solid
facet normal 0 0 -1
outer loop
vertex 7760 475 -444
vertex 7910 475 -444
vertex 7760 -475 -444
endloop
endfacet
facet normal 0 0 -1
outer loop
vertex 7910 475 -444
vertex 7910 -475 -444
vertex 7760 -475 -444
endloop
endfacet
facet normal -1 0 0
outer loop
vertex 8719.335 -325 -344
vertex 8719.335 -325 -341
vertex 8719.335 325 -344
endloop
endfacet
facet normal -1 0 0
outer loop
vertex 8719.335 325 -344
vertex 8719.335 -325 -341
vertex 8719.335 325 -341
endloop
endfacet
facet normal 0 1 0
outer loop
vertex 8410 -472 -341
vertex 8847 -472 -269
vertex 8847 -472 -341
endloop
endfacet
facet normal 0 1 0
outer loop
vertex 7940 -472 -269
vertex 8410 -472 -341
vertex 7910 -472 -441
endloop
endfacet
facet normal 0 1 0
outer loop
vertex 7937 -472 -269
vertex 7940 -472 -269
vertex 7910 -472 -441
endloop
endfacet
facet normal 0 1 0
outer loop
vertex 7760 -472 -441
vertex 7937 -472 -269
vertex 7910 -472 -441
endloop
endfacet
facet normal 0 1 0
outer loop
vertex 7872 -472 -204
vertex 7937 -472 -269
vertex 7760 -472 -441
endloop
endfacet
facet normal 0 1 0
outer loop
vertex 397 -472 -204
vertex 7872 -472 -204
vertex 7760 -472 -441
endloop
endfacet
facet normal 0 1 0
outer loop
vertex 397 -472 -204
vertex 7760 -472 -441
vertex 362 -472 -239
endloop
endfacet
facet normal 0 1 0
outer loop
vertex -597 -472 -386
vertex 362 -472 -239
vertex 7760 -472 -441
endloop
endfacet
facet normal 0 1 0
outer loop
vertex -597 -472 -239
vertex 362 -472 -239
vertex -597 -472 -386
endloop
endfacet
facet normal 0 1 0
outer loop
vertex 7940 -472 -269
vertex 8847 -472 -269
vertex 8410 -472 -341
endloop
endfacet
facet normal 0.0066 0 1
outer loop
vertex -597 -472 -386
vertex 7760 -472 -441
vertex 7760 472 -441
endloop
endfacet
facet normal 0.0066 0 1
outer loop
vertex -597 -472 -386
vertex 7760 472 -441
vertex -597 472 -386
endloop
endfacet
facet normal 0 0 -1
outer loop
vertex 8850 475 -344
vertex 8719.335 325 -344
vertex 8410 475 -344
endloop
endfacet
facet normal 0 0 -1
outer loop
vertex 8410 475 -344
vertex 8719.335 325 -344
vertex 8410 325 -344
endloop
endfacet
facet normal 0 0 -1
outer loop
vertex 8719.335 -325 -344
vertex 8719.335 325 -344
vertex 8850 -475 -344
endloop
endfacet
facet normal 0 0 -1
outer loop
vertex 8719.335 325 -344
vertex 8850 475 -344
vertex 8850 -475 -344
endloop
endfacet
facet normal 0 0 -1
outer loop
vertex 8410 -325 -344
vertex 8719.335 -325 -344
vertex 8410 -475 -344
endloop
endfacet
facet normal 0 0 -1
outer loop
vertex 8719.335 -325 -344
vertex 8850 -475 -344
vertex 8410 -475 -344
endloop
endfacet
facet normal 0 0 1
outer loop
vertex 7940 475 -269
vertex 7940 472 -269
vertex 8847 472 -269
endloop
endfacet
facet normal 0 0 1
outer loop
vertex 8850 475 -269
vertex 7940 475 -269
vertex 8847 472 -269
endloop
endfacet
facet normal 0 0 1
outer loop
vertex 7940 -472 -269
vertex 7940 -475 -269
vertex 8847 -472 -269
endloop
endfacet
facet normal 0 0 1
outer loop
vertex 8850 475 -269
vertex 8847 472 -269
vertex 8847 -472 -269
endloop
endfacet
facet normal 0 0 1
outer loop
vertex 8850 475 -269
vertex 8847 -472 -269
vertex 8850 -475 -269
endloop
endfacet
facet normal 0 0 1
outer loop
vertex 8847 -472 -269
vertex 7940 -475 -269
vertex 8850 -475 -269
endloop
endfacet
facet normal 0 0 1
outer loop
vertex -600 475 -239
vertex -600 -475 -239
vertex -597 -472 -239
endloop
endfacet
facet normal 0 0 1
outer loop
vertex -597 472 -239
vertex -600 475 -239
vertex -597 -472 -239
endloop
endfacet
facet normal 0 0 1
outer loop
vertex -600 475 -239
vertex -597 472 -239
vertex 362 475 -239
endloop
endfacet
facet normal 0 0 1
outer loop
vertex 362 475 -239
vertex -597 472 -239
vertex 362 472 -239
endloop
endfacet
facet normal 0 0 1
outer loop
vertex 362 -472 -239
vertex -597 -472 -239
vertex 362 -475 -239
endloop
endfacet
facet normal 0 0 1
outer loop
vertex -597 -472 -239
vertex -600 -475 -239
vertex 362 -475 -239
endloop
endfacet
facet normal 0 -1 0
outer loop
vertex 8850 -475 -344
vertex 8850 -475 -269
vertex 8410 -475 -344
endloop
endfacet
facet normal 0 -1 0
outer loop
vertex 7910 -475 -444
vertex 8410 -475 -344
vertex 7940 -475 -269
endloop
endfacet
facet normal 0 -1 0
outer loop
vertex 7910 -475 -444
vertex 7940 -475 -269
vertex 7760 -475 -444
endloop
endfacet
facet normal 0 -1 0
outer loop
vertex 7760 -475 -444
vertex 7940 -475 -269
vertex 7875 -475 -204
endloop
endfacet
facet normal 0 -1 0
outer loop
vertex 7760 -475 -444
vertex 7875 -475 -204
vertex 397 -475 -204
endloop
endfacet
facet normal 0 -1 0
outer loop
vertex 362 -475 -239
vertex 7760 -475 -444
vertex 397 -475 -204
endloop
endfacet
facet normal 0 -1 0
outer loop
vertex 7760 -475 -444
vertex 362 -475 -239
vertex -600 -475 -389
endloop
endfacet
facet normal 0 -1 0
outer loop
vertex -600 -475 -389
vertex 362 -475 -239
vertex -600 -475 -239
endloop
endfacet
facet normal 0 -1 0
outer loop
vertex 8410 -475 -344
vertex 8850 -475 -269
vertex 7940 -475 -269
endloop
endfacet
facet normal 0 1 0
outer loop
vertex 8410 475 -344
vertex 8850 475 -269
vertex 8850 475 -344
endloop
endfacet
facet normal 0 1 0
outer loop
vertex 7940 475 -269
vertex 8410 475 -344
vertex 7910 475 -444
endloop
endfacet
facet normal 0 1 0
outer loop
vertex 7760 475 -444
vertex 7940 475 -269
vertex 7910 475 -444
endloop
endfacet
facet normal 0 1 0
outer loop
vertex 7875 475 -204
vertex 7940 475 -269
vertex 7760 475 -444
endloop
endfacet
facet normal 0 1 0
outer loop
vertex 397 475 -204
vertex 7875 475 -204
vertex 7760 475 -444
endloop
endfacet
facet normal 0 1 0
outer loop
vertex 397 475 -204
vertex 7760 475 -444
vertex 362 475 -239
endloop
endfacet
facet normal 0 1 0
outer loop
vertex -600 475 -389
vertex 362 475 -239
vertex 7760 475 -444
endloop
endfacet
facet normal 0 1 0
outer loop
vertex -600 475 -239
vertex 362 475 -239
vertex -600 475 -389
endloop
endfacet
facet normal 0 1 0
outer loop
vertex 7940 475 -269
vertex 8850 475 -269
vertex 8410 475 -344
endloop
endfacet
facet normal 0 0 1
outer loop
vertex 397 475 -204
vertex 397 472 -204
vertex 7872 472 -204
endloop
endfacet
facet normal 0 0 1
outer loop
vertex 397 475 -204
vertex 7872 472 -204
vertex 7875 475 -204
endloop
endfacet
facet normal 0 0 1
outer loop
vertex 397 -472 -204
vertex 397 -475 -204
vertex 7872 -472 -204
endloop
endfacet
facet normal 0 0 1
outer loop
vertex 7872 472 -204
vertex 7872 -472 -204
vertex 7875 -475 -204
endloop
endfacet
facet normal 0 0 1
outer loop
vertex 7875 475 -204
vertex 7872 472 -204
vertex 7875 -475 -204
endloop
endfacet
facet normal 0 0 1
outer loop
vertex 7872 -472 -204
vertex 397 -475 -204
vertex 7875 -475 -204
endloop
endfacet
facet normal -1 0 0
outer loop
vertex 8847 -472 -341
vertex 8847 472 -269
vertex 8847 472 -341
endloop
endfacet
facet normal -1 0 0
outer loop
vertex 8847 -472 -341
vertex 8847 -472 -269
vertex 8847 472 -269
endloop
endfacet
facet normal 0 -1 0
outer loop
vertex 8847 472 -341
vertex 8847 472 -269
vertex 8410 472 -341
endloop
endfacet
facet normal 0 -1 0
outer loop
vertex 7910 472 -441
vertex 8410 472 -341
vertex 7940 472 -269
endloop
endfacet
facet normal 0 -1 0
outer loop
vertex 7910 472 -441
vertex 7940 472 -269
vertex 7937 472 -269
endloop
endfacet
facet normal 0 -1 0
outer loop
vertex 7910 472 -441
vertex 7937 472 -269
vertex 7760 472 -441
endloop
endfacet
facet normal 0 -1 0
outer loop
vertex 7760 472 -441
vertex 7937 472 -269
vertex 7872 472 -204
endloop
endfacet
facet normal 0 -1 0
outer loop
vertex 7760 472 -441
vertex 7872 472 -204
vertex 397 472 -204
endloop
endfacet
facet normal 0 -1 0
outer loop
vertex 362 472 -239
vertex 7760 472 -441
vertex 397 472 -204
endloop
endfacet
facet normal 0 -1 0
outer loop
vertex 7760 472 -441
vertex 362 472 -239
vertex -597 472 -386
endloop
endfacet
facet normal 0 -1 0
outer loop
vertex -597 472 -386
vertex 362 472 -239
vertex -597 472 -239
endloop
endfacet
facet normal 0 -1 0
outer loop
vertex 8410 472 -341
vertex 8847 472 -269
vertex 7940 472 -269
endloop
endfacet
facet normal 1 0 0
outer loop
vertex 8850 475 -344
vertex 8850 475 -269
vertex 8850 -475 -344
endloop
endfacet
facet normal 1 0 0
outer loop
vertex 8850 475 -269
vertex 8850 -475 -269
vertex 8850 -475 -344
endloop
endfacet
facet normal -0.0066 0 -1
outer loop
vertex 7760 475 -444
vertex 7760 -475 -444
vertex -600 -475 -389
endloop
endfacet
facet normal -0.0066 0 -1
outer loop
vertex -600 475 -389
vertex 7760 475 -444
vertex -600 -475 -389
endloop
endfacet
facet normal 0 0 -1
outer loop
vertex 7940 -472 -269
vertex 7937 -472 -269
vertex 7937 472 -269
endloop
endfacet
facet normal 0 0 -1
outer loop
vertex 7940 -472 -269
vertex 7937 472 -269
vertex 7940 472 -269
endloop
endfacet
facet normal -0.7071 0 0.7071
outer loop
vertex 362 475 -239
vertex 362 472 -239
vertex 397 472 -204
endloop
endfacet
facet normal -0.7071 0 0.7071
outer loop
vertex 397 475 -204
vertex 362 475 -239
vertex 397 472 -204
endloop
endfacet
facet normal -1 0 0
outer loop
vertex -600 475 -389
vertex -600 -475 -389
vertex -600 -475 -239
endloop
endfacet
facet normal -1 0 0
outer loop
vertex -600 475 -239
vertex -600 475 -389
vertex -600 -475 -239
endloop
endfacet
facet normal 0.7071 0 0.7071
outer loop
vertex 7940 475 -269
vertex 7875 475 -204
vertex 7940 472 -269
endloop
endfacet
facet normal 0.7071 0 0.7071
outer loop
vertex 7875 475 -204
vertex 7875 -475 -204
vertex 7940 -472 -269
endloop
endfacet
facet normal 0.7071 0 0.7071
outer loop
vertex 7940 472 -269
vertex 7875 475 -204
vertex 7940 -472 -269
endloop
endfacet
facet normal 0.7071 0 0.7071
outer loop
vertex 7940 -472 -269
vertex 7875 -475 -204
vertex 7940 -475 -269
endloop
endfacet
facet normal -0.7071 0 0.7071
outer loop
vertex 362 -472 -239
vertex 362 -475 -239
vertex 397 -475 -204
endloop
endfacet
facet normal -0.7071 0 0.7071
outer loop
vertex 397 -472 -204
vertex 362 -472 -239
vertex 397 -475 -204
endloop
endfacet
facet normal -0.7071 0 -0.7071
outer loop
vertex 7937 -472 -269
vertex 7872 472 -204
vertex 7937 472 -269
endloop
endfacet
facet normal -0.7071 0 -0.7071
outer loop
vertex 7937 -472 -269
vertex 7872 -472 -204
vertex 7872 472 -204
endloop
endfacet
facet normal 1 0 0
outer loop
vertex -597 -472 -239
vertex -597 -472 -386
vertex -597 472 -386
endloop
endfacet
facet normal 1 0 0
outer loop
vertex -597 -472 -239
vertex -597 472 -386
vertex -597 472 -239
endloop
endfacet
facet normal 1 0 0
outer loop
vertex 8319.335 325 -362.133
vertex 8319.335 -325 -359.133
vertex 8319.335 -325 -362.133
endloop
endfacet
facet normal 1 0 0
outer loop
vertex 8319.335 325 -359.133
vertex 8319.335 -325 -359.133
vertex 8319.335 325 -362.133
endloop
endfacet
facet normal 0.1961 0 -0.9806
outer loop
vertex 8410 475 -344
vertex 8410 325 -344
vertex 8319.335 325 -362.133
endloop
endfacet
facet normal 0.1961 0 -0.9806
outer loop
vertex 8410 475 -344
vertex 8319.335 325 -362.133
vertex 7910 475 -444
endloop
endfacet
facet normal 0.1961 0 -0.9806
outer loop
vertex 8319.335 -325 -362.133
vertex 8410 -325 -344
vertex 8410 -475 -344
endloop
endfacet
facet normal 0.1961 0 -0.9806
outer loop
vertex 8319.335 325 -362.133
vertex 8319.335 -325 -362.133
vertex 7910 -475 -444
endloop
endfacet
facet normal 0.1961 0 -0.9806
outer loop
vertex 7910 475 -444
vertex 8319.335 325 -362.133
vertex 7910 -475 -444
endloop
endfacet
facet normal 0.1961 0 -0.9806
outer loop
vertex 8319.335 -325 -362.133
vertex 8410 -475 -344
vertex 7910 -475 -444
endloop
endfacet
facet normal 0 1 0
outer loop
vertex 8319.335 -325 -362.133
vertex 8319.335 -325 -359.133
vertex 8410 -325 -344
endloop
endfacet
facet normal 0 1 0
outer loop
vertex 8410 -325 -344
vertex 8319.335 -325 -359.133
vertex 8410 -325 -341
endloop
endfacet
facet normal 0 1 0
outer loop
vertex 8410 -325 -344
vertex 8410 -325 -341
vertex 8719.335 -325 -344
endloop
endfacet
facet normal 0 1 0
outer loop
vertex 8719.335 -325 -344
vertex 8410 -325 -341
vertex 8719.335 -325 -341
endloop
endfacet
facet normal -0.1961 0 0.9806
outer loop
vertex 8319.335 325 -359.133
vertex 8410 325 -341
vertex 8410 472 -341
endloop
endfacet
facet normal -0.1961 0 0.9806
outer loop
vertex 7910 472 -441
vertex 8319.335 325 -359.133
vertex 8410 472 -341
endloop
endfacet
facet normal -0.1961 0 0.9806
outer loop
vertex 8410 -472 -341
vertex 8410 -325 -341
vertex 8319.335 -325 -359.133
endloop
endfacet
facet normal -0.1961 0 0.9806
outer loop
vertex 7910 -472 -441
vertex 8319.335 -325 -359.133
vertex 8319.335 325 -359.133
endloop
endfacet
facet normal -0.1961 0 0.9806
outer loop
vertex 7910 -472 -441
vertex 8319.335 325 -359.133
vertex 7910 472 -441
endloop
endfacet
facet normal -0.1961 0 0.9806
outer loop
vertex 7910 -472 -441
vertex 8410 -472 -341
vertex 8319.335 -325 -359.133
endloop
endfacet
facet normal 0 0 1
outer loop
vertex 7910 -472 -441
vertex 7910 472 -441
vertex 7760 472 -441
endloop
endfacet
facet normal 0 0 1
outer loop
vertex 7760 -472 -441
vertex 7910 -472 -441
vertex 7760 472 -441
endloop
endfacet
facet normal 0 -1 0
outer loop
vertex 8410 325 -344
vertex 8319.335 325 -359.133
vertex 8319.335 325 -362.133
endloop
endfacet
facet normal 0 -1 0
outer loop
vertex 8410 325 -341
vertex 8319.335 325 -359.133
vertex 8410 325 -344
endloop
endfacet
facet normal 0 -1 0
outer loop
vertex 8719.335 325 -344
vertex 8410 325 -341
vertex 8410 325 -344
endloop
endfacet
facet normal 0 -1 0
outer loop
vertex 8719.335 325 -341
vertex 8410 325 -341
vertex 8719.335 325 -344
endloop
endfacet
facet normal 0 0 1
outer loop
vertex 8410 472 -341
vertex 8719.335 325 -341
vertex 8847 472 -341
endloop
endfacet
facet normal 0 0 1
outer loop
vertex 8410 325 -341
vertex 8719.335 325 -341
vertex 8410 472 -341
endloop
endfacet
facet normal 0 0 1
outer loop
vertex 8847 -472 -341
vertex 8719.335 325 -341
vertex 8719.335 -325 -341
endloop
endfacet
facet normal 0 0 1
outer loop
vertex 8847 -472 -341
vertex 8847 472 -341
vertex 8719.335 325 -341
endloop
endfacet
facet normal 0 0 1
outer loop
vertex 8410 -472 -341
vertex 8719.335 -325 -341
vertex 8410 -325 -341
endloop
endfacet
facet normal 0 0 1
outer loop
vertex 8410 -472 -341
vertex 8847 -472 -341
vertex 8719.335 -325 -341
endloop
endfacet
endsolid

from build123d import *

# Parameters (mm, degrees)
SKETCH039_W      = 400
SKETCH039_H      = 650
EXTRUDE033_DEPTH = 25
EXTRUDE032_DEPTH = 472
EXTRUDE015_DEPTH = 475


with BuildPart() as extrude033:
    # Sketch039 → Extrude033 (new body, symmetric)
    with BuildSketch(Plane(origin=(371.334729, 0, 0), x_dir=(1, 0, 0), z_dir=(0, 0, 1))):
        with Locations((8300, 0)):
            Rectangle(SKETCH039_W, SKETCH039_H)
    extrude(amount=EXTRUDE033_DEPTH, both=True)


with BuildPart() as extrude033_1:
    # Extrude033 placement: moved
    add(extrude033.part.moved(Location((-152, 0, -350))))


with BuildPart() as extrude032:
    # Sketch040 → Extrude032 (new body, symmetric)
    with BuildSketch(Plane.XZ):
        Polygon((-597, -242), (362, -242), (397, -207), (7872, -207), (7937, -272), (8847, -272), (8847, -344), (8410, -344), (7910, -444), (7760, -444), (-597, -389), align=None)
    extrude(amount=EXTRUDE032_DEPTH, both=True)


with BuildPart() as extrude032_1:
    # Extrude032 placement: moved
    add(extrude032.part.moved(Location((0, 0, 3))))


with BuildPart() as cut004:
    # Sketch023 → Extrude015 (new body, symmetric)
    with BuildSketch(Plane.XZ):
        Polygon((-600, -239), (362, -239), (397, -204), (7875, -204), (7940, -269), (8850, -269), (8850, -344), (8410, -344), (7910, -444), (7760, -444), (-600, -389), align=None)
    extrude(amount=EXTRUDE015_DEPTH, both=True)

    # Cut002: cut Extrude032
    add(extrude032_1.part, mode=Mode.SUBTRACT)

    # Cut004: cut Extrude033
    add(extrude033_1.part, mode=Mode.SUBTRACT)


solid = cut004.part
